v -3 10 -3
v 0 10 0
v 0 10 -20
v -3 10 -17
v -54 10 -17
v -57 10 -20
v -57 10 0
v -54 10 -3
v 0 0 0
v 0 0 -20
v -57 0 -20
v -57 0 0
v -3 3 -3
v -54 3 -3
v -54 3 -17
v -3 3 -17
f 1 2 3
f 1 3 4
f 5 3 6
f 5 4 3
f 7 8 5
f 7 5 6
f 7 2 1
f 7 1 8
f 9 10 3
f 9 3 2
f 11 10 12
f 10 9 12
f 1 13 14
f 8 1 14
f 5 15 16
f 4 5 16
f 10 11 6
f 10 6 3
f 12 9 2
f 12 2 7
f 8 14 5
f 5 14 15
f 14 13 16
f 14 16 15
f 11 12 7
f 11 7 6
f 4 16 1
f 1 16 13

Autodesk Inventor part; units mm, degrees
ref_plane "YZ Plane" through (0, 0, 0) normal (1, 0, 0) x (0, 1, 0)
ref_plane "XZ Plane" through (0, 0, 0) normal (0, 1, 0) x (-1, 0, 0)
ref_plane "XY Plane" through (0, 0, 0) normal (0, 0, 1) x (1, 0, 0)
sketch "スケッチ1" plane through (0, 0, 0) normal (0, 1, 0) x (-1, 0, 0)
  line L0 (0, 0) -> (57, 0)
  line L1 (57, 0) -> (57, -20)
  line L2 (57, -20) -> (0, -20)
  line L3 (0, -20) -> (0, 0)
  dimension "d0" = 20
  dimension "d1" = 57
extrude "押し出し1" add sketch "スケッチ1" along normal blind 10
shell "シェル2" thickness 3 removed faces 1 at (-19, 10, -6.6667)
properties part number "suply_hub"
